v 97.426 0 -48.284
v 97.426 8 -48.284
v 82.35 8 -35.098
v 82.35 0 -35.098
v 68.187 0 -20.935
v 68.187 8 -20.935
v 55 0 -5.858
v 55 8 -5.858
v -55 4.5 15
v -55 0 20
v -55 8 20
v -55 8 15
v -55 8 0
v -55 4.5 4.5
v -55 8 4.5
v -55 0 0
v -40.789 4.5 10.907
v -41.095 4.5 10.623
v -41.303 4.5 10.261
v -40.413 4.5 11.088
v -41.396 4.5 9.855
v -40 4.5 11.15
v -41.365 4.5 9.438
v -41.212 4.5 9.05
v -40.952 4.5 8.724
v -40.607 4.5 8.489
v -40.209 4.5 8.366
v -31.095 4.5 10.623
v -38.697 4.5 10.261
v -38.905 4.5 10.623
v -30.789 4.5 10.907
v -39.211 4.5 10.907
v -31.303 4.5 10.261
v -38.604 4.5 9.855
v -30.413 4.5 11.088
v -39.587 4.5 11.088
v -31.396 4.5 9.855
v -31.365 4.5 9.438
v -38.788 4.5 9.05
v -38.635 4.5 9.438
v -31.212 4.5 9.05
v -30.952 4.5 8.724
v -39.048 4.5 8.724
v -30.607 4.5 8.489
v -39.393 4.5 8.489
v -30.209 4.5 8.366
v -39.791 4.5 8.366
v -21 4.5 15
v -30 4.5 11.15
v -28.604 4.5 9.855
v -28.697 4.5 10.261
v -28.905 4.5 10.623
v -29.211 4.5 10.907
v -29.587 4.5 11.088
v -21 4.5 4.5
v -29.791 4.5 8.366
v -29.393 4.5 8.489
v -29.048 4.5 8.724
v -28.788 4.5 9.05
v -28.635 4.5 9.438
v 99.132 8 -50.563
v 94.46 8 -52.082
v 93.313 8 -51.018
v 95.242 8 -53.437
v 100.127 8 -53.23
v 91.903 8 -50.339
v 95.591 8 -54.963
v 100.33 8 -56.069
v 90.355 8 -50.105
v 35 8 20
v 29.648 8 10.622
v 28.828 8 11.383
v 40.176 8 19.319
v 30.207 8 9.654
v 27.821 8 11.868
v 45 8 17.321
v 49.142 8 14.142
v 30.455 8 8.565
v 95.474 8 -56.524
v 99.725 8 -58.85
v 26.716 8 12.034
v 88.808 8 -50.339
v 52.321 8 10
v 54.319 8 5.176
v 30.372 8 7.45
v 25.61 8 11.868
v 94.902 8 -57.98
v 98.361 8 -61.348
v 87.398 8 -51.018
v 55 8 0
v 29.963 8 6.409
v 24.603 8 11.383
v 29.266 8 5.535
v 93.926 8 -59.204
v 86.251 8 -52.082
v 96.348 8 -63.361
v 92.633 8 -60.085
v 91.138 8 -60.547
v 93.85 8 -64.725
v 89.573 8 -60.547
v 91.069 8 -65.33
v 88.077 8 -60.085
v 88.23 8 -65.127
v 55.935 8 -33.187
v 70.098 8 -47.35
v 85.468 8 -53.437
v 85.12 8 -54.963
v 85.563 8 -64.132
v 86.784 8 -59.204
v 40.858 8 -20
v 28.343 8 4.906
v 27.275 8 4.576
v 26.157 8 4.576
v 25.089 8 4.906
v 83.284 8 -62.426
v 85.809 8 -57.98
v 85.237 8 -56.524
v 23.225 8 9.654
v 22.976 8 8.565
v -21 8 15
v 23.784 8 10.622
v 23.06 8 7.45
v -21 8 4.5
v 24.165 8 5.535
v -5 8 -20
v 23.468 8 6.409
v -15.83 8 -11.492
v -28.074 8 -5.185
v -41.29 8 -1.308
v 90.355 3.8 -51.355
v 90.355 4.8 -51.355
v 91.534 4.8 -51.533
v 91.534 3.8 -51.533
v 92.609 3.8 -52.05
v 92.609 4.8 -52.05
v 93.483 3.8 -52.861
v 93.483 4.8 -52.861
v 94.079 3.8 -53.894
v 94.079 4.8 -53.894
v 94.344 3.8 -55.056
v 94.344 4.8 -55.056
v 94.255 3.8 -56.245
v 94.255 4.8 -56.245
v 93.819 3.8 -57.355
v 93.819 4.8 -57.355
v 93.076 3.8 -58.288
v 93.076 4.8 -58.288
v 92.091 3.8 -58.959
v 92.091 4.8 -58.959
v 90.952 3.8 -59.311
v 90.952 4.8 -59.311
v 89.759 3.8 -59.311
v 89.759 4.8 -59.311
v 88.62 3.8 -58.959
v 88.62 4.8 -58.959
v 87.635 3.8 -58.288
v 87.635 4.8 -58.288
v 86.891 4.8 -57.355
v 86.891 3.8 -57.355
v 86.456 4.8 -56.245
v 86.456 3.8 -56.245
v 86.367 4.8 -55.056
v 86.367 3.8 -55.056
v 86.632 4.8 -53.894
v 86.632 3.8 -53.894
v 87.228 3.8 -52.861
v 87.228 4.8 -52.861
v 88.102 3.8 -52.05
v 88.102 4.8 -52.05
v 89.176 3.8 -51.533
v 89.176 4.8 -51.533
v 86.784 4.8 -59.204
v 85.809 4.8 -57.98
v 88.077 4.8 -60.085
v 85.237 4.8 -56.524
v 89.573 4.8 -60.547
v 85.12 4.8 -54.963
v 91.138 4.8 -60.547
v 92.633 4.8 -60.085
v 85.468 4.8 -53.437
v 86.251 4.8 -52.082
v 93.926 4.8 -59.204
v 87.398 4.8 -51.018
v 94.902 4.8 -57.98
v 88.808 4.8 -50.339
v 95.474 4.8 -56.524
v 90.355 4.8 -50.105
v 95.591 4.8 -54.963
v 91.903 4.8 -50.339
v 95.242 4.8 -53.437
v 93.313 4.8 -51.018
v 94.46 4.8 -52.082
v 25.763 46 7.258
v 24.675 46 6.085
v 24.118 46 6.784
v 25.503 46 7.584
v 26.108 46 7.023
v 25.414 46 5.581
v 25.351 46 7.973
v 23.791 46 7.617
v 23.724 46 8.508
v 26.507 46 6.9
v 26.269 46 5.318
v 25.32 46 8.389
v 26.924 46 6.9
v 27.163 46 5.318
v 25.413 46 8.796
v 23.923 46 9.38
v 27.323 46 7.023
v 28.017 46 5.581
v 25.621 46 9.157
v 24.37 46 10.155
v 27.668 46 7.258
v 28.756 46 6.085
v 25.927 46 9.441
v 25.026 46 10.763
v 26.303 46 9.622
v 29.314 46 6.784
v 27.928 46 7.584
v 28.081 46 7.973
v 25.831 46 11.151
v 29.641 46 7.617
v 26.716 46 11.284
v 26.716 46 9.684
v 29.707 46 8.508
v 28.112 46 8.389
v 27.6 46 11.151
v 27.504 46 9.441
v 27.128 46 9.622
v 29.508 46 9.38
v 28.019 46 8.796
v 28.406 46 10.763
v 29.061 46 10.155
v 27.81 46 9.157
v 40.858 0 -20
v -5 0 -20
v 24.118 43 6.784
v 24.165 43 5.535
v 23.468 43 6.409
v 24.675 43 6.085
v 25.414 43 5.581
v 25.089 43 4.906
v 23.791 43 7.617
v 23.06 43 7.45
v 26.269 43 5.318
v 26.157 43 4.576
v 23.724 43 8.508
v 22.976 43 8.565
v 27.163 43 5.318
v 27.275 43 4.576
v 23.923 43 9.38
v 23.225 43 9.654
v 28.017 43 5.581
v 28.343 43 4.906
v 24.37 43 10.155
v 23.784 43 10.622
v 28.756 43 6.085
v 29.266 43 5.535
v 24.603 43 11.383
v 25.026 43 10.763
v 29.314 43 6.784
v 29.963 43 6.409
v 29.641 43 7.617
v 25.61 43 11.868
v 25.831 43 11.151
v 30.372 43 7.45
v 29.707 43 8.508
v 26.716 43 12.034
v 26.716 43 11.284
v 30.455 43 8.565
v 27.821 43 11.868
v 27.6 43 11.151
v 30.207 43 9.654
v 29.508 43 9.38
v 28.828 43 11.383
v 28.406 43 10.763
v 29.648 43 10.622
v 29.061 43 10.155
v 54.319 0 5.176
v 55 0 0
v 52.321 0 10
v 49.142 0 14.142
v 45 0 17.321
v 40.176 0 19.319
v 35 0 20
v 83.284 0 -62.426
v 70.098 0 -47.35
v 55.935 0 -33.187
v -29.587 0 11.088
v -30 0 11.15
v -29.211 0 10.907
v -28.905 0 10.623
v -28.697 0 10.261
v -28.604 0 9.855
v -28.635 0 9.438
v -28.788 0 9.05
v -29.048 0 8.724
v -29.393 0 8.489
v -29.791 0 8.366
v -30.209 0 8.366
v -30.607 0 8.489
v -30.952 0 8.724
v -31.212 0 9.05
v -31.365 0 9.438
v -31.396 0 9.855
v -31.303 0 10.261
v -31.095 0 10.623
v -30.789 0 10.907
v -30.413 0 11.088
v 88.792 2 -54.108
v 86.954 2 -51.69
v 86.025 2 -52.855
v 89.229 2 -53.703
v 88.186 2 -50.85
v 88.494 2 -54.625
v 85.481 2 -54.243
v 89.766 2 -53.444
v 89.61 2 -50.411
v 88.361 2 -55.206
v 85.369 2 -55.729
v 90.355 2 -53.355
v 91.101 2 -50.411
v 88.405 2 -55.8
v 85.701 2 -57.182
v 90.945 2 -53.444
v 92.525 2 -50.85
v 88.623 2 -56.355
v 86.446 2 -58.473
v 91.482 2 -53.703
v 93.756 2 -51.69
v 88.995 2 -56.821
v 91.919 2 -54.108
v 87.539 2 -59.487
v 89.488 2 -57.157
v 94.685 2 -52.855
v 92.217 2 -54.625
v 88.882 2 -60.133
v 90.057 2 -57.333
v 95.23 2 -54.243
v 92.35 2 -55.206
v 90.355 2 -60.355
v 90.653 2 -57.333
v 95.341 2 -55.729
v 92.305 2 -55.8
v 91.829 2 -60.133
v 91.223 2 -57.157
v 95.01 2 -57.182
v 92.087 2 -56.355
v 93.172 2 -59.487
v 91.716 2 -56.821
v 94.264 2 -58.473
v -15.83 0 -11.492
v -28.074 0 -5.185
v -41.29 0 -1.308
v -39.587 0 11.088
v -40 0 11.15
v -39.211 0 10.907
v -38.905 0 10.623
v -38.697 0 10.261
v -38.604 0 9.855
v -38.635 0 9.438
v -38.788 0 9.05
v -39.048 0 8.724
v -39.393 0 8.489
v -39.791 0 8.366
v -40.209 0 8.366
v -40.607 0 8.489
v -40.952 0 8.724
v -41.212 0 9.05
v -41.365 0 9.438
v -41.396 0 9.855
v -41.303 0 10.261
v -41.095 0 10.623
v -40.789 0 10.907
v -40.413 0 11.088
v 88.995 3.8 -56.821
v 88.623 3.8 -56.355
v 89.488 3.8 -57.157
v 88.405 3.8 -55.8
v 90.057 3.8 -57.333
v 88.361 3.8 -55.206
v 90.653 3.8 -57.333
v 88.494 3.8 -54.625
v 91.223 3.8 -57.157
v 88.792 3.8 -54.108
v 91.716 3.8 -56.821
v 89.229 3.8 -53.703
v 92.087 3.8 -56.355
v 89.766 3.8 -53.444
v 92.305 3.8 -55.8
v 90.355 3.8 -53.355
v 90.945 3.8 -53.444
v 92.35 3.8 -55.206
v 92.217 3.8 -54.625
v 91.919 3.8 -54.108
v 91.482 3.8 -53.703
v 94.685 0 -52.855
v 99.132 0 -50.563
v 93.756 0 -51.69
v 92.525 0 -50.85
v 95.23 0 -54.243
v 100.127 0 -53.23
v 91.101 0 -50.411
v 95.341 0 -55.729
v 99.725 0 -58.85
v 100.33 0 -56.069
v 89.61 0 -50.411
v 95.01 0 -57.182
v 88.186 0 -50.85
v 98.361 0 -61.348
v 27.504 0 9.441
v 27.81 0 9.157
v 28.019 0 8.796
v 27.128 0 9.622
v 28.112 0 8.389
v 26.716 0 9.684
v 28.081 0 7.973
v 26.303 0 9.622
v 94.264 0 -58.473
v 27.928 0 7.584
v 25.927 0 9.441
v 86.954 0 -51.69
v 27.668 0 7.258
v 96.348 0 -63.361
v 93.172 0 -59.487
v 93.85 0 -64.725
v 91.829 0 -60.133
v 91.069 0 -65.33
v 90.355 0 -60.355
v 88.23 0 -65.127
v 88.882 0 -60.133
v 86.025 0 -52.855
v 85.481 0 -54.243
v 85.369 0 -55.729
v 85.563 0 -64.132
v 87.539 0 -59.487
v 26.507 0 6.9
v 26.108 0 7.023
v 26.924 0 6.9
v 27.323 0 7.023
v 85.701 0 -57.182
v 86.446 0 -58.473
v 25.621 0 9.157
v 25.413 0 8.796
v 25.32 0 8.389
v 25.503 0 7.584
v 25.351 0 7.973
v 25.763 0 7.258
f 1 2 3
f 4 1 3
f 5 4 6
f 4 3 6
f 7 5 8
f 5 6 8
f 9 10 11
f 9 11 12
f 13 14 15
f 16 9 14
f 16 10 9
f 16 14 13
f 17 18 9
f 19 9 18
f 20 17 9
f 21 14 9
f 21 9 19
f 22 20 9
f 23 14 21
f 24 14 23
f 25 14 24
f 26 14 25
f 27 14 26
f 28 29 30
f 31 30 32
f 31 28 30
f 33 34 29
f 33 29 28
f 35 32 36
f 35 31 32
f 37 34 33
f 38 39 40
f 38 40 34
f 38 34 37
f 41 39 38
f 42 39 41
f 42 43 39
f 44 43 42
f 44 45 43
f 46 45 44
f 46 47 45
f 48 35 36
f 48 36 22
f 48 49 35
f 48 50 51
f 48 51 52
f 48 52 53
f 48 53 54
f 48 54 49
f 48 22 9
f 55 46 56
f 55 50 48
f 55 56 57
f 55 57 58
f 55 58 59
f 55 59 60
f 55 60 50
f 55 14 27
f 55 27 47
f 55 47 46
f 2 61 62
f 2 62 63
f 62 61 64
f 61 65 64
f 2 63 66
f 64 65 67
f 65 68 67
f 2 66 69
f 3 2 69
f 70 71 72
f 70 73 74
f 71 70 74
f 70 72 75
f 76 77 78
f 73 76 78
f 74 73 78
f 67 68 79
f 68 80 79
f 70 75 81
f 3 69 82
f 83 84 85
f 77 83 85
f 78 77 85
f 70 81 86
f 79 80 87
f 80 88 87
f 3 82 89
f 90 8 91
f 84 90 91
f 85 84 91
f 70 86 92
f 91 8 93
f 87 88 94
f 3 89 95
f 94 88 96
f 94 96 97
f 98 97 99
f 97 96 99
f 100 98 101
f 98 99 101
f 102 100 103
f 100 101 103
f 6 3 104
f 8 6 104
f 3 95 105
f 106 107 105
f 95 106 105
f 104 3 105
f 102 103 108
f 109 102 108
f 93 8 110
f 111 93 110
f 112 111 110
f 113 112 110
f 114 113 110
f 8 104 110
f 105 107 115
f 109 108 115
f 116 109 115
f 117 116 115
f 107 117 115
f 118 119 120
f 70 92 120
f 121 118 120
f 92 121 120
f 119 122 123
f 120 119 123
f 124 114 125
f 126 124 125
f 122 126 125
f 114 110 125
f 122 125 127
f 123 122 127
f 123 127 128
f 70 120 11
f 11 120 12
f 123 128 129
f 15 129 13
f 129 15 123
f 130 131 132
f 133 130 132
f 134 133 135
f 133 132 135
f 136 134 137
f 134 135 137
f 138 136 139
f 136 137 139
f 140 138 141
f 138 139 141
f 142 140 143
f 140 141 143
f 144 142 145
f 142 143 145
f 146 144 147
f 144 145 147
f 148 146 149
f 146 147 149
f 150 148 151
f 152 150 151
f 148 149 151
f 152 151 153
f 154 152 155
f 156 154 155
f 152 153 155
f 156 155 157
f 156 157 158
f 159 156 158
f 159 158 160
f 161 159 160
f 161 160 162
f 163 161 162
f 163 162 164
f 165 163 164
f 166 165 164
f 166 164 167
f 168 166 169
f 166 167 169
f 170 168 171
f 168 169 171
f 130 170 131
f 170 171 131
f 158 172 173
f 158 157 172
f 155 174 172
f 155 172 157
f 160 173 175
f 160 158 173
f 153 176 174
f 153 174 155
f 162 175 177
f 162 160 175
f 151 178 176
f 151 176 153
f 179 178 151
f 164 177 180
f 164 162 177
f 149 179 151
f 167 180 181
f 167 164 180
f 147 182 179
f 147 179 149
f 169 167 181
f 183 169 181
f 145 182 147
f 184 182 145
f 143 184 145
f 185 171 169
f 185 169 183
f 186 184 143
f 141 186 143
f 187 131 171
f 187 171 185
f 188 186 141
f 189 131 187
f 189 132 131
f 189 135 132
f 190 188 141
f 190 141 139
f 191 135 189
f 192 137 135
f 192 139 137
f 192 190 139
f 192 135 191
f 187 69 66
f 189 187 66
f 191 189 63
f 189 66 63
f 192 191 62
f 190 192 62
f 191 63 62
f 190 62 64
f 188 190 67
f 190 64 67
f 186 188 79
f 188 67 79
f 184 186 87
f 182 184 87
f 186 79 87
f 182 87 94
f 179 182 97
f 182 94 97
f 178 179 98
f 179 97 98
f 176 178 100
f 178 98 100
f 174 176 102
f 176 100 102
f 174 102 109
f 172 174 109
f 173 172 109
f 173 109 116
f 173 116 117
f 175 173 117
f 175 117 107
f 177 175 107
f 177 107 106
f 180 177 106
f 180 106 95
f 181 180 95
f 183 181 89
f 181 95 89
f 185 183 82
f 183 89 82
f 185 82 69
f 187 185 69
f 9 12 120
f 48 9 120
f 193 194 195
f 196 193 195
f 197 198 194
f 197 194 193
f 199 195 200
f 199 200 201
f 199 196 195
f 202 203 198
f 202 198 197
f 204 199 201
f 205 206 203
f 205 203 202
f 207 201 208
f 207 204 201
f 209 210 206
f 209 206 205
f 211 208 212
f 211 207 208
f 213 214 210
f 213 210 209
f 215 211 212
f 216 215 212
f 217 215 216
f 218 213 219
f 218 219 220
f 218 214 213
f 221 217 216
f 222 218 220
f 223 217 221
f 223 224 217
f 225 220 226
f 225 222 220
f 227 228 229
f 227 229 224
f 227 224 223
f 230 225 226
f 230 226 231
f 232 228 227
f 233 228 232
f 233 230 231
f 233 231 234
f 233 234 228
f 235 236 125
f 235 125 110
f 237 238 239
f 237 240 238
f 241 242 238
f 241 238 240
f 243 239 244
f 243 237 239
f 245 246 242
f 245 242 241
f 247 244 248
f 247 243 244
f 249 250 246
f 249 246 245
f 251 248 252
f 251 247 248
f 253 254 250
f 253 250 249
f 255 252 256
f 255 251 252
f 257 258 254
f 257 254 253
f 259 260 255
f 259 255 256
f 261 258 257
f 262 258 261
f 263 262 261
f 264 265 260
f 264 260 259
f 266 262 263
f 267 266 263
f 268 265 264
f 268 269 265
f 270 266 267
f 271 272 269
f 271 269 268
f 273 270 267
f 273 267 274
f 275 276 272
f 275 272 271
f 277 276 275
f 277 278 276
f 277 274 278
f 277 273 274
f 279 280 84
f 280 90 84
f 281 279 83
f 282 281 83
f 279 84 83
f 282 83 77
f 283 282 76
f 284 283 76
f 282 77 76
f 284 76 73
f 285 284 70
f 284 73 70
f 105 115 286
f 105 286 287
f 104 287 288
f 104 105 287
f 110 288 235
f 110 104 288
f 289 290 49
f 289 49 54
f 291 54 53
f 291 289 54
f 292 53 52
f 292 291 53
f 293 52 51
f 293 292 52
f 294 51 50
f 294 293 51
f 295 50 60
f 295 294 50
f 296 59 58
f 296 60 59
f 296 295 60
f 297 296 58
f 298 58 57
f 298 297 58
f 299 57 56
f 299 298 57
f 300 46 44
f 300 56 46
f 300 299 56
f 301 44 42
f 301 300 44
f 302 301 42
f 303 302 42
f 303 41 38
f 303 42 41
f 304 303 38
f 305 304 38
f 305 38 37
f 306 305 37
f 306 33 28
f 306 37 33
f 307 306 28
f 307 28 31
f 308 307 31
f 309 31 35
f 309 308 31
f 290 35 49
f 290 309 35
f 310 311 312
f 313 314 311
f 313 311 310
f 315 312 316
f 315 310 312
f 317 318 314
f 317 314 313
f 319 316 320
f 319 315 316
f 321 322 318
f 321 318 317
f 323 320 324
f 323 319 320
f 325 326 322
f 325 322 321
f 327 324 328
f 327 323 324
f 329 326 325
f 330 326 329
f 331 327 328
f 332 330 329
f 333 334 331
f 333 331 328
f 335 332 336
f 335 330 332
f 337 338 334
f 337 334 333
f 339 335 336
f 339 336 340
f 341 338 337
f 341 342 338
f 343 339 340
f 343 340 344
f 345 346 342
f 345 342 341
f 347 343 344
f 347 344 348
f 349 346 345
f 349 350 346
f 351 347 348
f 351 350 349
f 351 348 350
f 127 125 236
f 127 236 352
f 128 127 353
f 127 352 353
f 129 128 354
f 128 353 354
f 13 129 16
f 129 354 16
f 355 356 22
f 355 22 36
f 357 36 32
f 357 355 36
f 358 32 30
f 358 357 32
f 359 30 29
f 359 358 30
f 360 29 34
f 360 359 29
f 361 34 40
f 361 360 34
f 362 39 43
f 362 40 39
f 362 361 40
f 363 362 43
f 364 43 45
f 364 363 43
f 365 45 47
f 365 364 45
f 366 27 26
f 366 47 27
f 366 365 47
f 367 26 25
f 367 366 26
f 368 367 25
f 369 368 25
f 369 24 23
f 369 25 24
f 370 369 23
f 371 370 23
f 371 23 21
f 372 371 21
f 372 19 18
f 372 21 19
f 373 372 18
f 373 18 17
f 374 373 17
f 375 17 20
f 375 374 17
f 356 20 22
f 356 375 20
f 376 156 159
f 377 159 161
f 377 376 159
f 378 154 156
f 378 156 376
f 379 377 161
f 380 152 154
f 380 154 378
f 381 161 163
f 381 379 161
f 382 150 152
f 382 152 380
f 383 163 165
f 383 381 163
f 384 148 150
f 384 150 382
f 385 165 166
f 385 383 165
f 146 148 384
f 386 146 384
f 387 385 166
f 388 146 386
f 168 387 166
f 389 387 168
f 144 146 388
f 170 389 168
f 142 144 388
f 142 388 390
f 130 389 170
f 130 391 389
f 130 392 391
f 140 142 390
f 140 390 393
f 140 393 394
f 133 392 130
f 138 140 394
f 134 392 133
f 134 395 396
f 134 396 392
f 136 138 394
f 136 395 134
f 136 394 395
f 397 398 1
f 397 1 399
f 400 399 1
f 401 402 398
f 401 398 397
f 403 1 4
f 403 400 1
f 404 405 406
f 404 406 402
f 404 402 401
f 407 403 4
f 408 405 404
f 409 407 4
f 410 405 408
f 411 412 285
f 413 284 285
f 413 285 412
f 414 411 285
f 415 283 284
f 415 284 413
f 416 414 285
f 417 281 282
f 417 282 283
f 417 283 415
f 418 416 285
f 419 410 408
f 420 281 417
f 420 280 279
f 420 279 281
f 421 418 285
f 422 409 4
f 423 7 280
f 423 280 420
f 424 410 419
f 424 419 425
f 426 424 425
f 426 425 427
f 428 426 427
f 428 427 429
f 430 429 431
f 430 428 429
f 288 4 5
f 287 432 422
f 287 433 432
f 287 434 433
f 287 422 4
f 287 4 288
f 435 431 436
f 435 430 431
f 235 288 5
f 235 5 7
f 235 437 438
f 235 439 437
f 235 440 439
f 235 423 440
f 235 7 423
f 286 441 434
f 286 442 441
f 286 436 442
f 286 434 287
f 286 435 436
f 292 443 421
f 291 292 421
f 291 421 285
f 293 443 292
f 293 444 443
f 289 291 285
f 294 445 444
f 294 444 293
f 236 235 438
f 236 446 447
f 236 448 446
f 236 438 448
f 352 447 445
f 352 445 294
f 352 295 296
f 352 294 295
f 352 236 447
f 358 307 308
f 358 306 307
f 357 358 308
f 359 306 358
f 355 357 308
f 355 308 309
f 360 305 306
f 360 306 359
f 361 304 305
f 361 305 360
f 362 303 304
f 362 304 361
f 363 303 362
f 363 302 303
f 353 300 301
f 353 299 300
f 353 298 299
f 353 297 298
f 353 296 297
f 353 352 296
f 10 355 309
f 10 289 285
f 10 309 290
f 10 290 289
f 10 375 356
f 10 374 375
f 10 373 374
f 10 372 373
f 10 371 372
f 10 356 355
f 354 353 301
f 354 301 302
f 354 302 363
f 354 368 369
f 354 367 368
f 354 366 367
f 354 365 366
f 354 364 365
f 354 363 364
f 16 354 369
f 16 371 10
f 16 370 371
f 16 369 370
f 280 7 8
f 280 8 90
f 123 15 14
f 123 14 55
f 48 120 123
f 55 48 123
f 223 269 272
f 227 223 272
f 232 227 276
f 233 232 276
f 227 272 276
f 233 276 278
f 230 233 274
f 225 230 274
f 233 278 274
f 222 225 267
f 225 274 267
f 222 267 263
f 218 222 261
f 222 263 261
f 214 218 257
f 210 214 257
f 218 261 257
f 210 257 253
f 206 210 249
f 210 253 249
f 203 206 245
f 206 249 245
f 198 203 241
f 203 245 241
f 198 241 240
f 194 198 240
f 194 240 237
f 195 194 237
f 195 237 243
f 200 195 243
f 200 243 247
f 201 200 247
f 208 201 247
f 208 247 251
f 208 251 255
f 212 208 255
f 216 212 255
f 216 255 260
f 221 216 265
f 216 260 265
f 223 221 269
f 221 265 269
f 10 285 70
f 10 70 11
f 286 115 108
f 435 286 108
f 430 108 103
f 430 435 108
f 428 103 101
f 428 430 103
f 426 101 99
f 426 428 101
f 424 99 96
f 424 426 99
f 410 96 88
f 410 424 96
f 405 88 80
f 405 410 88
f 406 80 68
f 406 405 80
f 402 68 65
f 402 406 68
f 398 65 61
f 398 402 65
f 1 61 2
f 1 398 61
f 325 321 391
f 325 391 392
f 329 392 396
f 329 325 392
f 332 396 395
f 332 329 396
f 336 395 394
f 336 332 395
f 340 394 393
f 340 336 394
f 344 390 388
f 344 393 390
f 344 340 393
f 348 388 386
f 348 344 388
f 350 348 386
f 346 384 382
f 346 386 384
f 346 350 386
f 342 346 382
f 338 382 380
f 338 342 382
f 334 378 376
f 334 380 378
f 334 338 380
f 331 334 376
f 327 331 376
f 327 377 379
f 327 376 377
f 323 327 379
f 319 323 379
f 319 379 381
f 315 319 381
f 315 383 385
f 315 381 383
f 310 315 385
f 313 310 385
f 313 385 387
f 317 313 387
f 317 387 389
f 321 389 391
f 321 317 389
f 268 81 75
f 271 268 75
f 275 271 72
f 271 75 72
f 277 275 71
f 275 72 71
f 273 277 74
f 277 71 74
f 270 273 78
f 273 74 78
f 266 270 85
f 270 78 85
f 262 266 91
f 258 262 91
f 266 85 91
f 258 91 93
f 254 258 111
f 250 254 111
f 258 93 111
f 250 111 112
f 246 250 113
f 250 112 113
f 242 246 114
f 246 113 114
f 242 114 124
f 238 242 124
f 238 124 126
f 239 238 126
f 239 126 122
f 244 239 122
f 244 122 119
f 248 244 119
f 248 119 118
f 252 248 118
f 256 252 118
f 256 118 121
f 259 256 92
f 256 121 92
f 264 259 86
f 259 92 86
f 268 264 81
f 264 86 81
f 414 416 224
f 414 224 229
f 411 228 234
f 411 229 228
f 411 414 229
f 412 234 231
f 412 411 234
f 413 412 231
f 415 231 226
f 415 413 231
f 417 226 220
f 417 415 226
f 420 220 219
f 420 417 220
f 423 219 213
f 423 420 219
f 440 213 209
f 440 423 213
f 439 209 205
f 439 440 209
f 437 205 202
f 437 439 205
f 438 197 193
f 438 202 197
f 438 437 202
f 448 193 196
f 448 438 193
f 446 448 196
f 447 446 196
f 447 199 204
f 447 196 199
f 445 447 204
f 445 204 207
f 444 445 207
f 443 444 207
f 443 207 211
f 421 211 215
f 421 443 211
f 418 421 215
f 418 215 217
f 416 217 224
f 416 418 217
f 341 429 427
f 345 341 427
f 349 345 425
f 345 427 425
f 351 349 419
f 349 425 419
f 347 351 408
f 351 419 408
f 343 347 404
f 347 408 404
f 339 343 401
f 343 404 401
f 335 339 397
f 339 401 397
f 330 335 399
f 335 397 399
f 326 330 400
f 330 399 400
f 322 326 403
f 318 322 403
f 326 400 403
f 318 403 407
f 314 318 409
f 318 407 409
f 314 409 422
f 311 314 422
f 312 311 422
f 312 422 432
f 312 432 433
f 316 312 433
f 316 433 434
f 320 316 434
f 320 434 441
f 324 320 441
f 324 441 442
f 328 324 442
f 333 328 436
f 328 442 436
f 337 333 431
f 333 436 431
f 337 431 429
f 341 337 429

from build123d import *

# Parameters (mm, degrees)
BOSS_EXTRUDE1_DEPTH      = 8
CUT_EXTRUDE1_DEPTH       = 121.027140353
CUT_EXTRUDE1_DEPTH_BACK  = 121.027140353
SKETCH2_R                = 1.4
CUT_EXTRUDE2_DEPTH       = 121.027140353
SKETCH4_R                = 5.25
CUT_EXTRUDE3_DEPTH       = 3.2
SKETCH5_R                = 4
CUT_EXTRUDE4_DEPTH       = 1
SKETCH6_R                = 5
CUT_EXTRUDE5_DEPTH       = 2
CUT_EXTRUDE6_DEPTH       = 120.833861747
CUT_EXTRUDE6_DEPTH_BACK  = 120.833861747
SKETCH7_R                = 2
SKETCH9_R                = 3.75
BOSS_EXTRUDE2_DEPTH      = 35
SKETCH10_R               = 3
BOSS_EXTRUDE3_DEPTH      = 3
CUT_EXTRUDE8_DEPTH       = 129.29074176
CUT_EXTRUDE8_DEPTH_BACK  = 129.29074176
SKETCH11_R               = 1.4
CUT_EXTRUDE9_DEPTH       = 126.644396697
CUT_EXTRUDE9_DEPTH_BACK  = 126.644396697
SKETCH13_W               = 34
SKETCH13_H               = 10.5
CUT_EXTRUDE10_DEPTH      = 3.5
FILLET2_R                = 20
CUT_EXTRUDE11_DEPTH      = 127.746851721
CUT_EXTRUDE11_DEPTH_BACK = 127.746851721
SKETCH14_R               = 1.4


with BuildPart() as part:
    # Sketch1 → Boss-Extrude1 (new body)
    with BuildSketch(Plane(origin=(0, 0, 0), x_dir=(1, 0, 0), z_dir=(0, 1, 0))):
        with BuildLine():
            Line((40.857864376, 20), (83.284271247, 62.426406871))
            ThreePointArc((83.284271247, 62.426406871), (97.426406871, 62.426406871), (97.426406871, 48.284271247))
            Line((97.426406871, 48.284271247), (55, 5.857864376))
            Line((55, 5.857864376), (55, -20))
            Line((55, -20), (-55, -20))
            Line((-55, -20), (-55, 20))
            Line((-55, 20), (40.857864376, 20))
        make_face()
    extrude(amount=BOSS_EXTRUDE1_DEPTH)

    # Sketch2 → Cut-Extrude1 (cut, two sides: drawn at the far end of the back side and taken through both)
    with BuildSketch(Plane(origin=(0, 8, 0), x_dir=(1, 0, 0), z_dir=(0, 1, 0)).offset(-CUT_EXTRUDE1_DEPTH_BACK)):
        with Locations((90.355339059, 55.355339059)):
            Circle(SKETCH2_R)
        with Locations((26.715728753, -8.284271247)):
            Circle(SKETCH2_R)
    extrude(amount=CUT_EXTRUDE1_DEPTH + CUT_EXTRUDE1_DEPTH_BACK, mode=Mode.SUBTRACT)

    # Sketch3 → Cut-Extrude2 (cut, symmetric)
    with BuildSketch(Plane(origin=(0, 8, 0), x_dir=(1, 0, 0), z_dir=(0, 1, 0))):
        with BuildLine():
            Line((40.857864376, 20), (83.284271247, 62.426406871))
            ThreePointArc((83.284271247, 62.426406871), (63.134392976, 40.149878272), (40.857864376, 20))
        make_face()
    cut_extrude2 = extrude(amount=CUT_EXTRUDE2_DEPTH, both=True, mode=Mode.SUBTRACT)

    # Mirror1: Cut-Extrude2 across plane
    add(cut_extrude2.mirror(Plane(origin=(17.5, 0, 17.5), x_dir=(-0.7071067811865461, 0, 0.707106781186549), z_dir=(0.7071067811865492, 0, 0.7071067811865459))), mode=Mode.SUBTRACT)

    # Sketch4 → Cut-Extrude3 (cut)
    with BuildSketch(Plane(origin=(0, 8, 0), x_dir=(1, 0, 0), z_dir=(0, 1, 0))):
        with Locations((90.355339059, 55.355339059)):
            Circle(SKETCH4_R)
    extrude(amount=-CUT_EXTRUDE3_DEPTH, mode=Mode.SUBTRACT)

    # Sketch5 → Cut-Extrude4 (cut)
    with BuildSketch(Plane(origin=(0, 4.8, 0), x_dir=(1, 0, 0), z_dir=(0, 1, 0))):
        with Locations((90.355339059, 55.355339059)):
            Circle(SKETCH5_R)
    extrude(amount=-CUT_EXTRUDE4_DEPTH, mode=Mode.SUBTRACT)

    # Sketch6 → Cut-Extrude5 (cut)
    with BuildSketch(Plane.XZ):
        with Locations((90.355339059, -55.355339059)):
            Circle(SKETCH6_R)
    extrude(amount=-CUT_EXTRUDE5_DEPTH, mode=Mode.SUBTRACT)

    # Sketch7 → Cut-Extrude6 (cut, two sides: drawn at the far end of the back side and taken through both)
    with BuildSketch(Plane(origin=(0, 3.8, 0), x_dir=(1, 0, 0), z_dir=(0, 1, 0)).offset(-CUT_EXTRUDE6_DEPTH_BACK)):
        with Locations((90.355339059, 55.355339059)):
            Circle(SKETCH7_R)
    extrude(amount=CUT_EXTRUDE6_DEPTH + CUT_EXTRUDE6_DEPTH_BACK, mode=Mode.SUBTRACT)

    # Sketch9 → Boss-Extrude2 (add)
    with BuildSketch(Plane(origin=(0, 8, 0), x_dir=(1, 0, 0), z_dir=(0, 1, 0))):
        with Locations((26.715728753, -8.284271247)):
            Circle(SKETCH9_R)
    extrude(amount=BOSS_EXTRUDE2_DEPTH)

    # Sketch10 → Boss-Extrude3 (add)
    with BuildSketch(Plane(origin=(0, 43, 0), x_dir=(1, 0, 0), z_dir=(0, 1, 0))):
        with Locations((26.715728753, -8.284271247)):
            Circle(SKETCH10_R)
    extrude(amount=BOSS_EXTRUDE3_DEPTH)

    # Sketch11 → Cut-Extrude8 (cut, two sides: drawn at the far end of the back side and taken through both)
    with BuildSketch(Plane(origin=(0, 46, 0), x_dir=(1, 0, 0), z_dir=(0, 1, 0)).offset(-CUT_EXTRUDE8_DEPTH_BACK)):
        with Locations((26.715728753, -8.284271247)):
            Circle(SKETCH11_R)
    extrude(amount=CUT_EXTRUDE8_DEPTH + CUT_EXTRUDE8_DEPTH_BACK, mode=Mode.SUBTRACT)

    # Sketch12 → Cut-Extrude9 (cut, two sides: drawn at the far end of the back side and taken through both)
    with BuildSketch(Plane(origin=(0, 8, 0), x_dir=(1, 0, 0), z_dir=(0, 1, 0)).offset(-CUT_EXTRUDE9_DEPTH_BACK)):
        with BuildLine():
            Line((-55, 0), (-55, 20))
            Line((-55, 20), (-5, 20))
            ThreePointArc((-5, 20), (-28.074175964, 5.185439911), (-55, 0))
        make_face()
    extrude(amount=CUT_EXTRUDE9_DEPTH + CUT_EXTRUDE9_DEPTH_BACK, mode=Mode.SUBTRACT)

    # Sketch13 → Cut-Extrude10 (cut)
    with BuildSketch(Plane(origin=(0, 8, 0), x_dir=(1, 0, 0), z_dir=(0, 1, 0))):
        with Locations((-38, -9.75)):
            Rectangle(SKETCH13_W, SKETCH13_H)
    extrude(amount=-CUT_EXTRUDE10_DEPTH, mode=Mode.SUBTRACT)

    # Fillet2
    fillet2_edges = [part.edges().sort_by_distance(p)[0] for p in [
        (55, 4, 20),
    ]]
    fillet(fillet2_edges, radius=FILLET2_R)

    # Sketch14 → Cut-Extrude11 (cut, two sides: drawn at the far end of the back side and taken through both)
    with BuildSketch(Plane(origin=(0, 4.5, 0), x_dir=(1, 0, 0), z_dir=(0, 1, 0)).offset(-CUT_EXTRUDE11_DEPTH_BACK)):
        with Locations((-40, -9.75)):
            Circle(SKETCH14_R)
        with Locations((-30, -9.75)):
            Circle(SKETCH14_R)
    extrude(amount=CUT_EXTRUDE11_DEPTH + CUT_EXTRUDE11_DEPTH_BACK, mode=Mode.SUBTRACT)


solid = part.part
